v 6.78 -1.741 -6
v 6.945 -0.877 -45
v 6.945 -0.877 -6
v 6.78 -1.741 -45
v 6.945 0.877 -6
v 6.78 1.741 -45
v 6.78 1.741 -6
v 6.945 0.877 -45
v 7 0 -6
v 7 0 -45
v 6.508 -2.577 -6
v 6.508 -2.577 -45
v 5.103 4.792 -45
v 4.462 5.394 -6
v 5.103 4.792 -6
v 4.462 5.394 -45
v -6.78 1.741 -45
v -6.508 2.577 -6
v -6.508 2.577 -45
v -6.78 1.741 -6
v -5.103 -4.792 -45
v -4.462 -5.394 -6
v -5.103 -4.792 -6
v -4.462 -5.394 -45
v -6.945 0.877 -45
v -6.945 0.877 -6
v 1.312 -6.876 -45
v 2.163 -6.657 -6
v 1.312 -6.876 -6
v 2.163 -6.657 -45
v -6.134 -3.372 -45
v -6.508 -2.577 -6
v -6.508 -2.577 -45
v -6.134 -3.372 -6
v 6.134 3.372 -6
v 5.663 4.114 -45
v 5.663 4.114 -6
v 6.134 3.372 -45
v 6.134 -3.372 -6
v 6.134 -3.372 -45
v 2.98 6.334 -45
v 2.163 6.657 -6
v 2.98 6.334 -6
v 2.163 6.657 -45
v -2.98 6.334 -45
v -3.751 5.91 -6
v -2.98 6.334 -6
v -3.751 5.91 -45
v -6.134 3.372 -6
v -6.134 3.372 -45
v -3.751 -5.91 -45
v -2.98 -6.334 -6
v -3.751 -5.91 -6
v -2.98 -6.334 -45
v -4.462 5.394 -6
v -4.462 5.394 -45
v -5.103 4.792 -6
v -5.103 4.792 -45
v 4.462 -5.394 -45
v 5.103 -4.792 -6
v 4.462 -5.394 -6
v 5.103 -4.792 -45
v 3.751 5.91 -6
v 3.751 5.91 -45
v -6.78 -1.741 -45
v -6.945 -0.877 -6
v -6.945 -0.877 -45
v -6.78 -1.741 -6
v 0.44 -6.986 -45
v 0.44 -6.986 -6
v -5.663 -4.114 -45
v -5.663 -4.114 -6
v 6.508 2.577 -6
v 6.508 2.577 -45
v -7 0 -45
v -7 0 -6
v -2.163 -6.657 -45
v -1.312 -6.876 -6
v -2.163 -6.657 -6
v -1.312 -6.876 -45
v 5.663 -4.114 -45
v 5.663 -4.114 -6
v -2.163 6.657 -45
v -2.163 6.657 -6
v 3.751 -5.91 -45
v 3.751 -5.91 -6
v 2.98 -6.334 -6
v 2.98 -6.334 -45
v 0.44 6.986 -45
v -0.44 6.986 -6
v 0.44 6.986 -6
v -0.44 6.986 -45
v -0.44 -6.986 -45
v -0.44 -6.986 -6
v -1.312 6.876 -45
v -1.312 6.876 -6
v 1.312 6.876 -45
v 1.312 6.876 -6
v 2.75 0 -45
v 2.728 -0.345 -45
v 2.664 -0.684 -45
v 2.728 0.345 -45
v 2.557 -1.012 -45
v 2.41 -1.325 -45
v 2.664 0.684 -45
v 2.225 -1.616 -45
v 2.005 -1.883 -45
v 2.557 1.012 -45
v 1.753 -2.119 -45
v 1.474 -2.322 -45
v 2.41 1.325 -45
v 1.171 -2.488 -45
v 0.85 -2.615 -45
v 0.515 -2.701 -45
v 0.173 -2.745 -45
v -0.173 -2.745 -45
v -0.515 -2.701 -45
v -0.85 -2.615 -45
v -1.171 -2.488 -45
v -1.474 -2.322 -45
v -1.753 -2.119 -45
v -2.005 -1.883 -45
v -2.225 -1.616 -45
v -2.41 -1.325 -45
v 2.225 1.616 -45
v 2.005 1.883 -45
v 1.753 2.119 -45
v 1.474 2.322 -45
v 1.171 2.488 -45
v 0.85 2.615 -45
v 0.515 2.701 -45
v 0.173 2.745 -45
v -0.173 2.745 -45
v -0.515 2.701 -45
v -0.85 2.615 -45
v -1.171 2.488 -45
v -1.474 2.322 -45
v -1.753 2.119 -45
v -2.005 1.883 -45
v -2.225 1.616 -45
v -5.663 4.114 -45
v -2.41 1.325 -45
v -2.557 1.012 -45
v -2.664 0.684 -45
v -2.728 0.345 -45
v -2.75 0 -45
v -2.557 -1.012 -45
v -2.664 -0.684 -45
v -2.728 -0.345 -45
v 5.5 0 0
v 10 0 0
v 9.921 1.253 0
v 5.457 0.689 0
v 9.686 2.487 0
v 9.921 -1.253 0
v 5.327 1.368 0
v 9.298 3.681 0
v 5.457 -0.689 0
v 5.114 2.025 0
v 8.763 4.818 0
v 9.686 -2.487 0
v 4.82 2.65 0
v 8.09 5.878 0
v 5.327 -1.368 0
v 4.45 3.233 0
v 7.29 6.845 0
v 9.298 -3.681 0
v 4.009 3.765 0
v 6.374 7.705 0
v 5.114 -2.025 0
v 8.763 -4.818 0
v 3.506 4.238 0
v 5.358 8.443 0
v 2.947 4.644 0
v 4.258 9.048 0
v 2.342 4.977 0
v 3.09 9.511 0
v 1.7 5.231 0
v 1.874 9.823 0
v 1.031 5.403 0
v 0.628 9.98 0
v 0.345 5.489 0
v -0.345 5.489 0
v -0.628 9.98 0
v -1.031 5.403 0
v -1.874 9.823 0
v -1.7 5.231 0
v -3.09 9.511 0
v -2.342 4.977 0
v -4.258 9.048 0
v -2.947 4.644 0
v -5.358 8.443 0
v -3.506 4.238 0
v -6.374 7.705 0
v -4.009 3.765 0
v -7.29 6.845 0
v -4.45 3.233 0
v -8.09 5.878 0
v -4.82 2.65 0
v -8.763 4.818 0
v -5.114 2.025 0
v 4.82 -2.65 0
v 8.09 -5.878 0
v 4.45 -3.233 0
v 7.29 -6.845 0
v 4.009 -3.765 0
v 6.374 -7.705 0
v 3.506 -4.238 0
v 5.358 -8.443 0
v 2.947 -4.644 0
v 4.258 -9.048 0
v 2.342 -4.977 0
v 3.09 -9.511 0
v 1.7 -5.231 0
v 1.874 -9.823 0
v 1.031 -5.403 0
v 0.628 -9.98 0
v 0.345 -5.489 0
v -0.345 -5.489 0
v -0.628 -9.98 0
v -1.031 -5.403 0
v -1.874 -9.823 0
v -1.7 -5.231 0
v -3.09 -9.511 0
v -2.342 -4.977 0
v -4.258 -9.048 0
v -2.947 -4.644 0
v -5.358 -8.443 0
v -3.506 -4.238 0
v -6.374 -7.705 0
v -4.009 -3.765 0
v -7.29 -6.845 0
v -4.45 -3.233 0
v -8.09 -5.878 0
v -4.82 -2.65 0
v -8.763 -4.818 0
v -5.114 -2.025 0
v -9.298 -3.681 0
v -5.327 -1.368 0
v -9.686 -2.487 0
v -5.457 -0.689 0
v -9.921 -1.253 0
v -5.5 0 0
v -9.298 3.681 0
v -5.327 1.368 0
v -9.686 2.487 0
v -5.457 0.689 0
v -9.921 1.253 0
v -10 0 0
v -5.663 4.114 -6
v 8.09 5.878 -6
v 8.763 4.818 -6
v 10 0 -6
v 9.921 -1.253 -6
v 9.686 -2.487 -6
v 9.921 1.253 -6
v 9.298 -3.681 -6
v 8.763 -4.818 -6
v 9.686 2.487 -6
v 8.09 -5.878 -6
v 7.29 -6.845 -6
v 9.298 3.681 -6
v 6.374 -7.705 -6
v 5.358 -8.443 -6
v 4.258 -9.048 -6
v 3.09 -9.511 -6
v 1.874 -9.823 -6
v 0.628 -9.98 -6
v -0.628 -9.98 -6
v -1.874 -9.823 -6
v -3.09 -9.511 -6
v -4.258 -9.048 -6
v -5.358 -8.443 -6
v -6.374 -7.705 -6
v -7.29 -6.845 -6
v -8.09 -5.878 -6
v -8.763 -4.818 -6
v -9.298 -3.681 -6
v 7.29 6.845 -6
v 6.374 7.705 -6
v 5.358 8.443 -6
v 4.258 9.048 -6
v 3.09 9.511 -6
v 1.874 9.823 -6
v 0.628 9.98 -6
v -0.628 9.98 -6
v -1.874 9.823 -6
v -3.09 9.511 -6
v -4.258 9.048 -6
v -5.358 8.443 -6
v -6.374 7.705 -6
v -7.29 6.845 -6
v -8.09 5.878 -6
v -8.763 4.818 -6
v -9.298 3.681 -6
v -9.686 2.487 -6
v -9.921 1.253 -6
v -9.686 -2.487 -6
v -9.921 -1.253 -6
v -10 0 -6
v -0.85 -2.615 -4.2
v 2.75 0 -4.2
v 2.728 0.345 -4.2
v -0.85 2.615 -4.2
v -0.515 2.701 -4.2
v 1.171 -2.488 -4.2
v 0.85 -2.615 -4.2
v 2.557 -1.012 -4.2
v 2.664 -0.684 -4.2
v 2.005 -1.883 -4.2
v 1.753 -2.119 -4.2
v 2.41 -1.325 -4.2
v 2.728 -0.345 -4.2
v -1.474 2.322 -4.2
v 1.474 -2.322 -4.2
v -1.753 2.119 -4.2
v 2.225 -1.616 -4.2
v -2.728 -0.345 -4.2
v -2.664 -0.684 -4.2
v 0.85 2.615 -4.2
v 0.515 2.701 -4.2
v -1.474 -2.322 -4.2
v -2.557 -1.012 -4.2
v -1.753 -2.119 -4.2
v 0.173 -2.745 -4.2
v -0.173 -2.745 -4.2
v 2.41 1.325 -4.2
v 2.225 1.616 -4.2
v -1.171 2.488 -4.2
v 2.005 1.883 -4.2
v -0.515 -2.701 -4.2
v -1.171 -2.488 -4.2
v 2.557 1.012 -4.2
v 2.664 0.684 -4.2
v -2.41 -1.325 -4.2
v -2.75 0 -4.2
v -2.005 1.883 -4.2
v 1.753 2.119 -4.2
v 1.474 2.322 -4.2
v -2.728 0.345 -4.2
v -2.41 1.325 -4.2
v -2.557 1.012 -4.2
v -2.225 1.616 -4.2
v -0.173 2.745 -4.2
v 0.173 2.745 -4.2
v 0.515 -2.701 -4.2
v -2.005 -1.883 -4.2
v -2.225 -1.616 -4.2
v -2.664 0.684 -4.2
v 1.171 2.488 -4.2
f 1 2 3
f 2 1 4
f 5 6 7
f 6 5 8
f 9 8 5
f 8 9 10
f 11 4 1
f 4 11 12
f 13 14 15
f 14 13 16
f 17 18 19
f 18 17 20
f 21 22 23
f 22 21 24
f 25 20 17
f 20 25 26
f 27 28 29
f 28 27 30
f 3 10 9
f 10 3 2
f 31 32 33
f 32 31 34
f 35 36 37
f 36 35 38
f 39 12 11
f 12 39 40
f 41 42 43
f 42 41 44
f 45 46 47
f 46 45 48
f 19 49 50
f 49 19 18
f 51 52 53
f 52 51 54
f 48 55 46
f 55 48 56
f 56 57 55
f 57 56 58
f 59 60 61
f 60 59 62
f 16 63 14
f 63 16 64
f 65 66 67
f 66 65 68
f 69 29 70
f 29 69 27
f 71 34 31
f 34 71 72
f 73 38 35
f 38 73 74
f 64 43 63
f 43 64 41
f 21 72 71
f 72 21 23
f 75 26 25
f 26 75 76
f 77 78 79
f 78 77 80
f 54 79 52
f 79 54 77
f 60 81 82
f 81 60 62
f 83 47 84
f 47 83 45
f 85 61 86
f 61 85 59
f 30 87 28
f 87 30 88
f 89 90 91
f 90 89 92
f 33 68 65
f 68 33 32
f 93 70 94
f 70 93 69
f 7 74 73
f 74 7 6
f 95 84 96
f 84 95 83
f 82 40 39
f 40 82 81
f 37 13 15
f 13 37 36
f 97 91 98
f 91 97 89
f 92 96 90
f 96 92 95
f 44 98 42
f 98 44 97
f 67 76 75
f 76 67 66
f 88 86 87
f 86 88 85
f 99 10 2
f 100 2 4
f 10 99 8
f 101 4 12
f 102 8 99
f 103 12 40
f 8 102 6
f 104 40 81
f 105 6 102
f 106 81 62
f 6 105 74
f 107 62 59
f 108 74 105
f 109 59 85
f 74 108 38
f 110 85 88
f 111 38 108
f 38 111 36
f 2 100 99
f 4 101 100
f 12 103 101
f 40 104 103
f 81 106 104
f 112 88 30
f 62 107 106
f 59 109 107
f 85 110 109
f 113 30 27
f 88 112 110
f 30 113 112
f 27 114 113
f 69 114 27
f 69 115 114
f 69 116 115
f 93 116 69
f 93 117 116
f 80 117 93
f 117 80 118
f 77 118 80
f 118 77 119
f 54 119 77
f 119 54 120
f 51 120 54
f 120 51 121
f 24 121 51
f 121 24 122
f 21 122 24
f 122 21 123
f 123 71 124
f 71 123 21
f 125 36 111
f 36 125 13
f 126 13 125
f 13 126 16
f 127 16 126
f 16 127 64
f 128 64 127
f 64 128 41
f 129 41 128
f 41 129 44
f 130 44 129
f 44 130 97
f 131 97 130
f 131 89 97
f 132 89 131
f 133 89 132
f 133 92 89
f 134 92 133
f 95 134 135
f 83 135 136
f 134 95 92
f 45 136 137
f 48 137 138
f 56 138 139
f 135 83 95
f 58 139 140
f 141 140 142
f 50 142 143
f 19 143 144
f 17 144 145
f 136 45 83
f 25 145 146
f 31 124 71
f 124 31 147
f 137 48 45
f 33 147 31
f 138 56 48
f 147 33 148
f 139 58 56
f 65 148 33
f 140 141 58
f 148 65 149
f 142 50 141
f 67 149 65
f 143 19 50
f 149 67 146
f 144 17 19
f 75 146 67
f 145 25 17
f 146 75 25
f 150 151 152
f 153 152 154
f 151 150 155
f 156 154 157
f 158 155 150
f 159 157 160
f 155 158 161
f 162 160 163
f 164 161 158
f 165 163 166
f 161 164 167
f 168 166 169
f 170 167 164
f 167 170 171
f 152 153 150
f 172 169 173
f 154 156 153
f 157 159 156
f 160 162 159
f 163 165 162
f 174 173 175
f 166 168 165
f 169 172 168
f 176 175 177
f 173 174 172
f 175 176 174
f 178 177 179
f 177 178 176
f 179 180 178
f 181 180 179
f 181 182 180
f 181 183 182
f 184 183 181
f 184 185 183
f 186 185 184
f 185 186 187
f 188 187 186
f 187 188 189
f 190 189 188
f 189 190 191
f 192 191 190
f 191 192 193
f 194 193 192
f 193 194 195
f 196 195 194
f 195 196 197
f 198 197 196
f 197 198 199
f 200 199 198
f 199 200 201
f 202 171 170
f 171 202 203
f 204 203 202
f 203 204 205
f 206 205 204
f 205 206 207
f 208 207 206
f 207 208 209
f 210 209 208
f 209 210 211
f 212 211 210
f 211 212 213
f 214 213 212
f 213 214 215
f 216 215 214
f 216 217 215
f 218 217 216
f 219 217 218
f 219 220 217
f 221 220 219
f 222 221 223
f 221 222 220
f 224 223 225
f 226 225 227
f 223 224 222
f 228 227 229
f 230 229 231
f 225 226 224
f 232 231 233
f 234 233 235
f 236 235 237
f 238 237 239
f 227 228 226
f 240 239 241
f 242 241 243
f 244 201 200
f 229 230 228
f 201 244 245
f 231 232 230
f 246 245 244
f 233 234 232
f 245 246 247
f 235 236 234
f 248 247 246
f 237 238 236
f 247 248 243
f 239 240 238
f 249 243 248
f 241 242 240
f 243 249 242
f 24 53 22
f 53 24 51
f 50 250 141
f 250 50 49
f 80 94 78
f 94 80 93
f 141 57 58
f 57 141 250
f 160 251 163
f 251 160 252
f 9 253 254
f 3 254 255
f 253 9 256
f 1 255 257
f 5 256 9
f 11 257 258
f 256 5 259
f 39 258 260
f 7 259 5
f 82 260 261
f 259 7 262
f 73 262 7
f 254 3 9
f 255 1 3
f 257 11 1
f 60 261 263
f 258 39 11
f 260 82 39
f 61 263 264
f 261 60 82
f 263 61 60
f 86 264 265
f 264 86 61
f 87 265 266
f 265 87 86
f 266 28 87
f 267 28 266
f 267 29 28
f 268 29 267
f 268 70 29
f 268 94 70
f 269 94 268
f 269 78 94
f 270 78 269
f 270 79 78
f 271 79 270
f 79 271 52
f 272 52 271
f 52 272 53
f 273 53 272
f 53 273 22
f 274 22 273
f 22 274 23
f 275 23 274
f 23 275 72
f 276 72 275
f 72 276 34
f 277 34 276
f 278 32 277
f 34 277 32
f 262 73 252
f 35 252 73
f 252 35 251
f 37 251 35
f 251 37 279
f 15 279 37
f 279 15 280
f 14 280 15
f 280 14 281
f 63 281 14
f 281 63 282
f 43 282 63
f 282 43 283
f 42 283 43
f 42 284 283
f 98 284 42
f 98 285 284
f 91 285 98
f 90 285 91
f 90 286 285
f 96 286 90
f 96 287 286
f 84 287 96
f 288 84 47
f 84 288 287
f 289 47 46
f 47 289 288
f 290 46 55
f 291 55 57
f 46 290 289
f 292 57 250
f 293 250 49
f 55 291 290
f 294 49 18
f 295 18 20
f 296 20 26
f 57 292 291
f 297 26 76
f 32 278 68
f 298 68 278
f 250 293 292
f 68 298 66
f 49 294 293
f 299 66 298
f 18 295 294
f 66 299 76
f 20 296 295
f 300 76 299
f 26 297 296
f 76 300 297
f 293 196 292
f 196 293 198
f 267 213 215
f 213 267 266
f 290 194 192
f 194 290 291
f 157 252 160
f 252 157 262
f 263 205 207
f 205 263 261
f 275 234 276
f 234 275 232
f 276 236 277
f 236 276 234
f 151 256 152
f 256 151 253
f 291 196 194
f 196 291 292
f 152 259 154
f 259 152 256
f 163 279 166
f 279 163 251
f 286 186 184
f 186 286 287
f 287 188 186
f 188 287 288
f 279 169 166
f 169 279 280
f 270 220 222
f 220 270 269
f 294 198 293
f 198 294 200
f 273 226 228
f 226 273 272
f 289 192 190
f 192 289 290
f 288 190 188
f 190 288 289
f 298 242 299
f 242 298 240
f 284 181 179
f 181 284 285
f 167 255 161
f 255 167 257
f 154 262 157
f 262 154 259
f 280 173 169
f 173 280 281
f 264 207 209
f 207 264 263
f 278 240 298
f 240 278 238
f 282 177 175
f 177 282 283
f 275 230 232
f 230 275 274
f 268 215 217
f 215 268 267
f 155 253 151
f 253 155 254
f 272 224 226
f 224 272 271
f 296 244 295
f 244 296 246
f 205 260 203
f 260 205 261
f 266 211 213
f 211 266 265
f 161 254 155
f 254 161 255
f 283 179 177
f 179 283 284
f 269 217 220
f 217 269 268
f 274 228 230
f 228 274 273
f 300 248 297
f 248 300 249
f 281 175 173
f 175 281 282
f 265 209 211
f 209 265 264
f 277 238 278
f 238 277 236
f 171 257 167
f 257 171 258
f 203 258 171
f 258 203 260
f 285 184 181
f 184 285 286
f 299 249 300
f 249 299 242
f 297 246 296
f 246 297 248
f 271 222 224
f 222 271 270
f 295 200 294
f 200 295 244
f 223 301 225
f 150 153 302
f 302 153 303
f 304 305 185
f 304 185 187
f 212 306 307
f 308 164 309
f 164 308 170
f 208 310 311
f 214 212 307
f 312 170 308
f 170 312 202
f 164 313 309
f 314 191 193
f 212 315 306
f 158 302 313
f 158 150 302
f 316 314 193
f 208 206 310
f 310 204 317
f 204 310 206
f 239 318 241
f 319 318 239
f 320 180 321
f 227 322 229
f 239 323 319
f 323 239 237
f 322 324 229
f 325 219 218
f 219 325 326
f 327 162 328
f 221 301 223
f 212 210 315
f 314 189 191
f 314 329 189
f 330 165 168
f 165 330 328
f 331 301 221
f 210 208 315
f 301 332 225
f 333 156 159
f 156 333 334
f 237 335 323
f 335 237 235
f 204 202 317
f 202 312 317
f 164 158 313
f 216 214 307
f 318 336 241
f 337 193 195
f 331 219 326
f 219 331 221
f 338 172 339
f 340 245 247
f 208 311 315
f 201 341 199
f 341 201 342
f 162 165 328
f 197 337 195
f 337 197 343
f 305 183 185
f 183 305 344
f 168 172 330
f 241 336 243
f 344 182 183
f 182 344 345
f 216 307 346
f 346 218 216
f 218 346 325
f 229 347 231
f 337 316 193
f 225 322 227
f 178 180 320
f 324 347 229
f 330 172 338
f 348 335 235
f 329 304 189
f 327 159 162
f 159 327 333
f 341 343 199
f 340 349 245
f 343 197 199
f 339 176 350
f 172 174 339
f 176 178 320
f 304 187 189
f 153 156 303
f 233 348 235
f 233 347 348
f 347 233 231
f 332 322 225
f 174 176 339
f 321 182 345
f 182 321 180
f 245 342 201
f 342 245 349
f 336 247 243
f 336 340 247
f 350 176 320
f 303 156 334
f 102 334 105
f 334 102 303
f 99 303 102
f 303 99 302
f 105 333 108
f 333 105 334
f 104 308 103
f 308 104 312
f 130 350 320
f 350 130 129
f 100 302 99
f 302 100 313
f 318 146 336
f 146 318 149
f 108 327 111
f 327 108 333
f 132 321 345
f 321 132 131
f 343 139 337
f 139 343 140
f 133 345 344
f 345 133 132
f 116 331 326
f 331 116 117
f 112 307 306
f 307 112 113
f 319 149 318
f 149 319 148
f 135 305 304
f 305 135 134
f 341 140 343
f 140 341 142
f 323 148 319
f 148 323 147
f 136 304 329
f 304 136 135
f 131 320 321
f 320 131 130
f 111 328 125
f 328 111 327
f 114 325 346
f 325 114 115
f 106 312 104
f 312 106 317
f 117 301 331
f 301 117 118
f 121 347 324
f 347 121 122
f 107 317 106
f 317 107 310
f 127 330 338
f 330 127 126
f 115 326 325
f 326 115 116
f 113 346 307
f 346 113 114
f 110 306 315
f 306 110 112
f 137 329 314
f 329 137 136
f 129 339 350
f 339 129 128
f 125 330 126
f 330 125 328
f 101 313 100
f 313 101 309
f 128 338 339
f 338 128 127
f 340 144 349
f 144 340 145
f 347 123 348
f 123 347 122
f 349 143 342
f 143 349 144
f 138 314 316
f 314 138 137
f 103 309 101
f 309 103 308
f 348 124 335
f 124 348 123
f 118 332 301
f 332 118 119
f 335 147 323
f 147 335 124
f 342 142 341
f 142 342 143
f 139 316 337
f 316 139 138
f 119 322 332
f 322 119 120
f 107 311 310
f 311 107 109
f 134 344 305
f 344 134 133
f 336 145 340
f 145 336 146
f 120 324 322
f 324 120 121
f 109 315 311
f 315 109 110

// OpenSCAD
$fn = 50;


difference() {
	union() {
		translate(v = [0, 0, -45.0000000000]) {
			cylinder(h = 45, r = 7.0000000000);
		}
		translate(v = [0, 0, -6.0000000000]) {
			cylinder(h = 6, r = 10.0000000000);
		}
	}
	union() {
		translate(v = [0, 0, 0]) {
			rotate(a = [0, 0, 0]) {
				difference() {
					union() {
						#translate(v = [0, 0, -45.0000000000]) {
							cylinder(h = 45, r = 2.2500000000);
						}
						#translate(v = [0, 0, -4.2000000000]) {
							cylinder(h = 4.2000000000, r = 7.0000000000, r1 = 2.7500000000, r2 = 5.5000000000);
						}
						#translate(v = [0, 0, -45.0000000000]) {
							cylinder(h = 45, r = 2.7500000000);
						}
						#translate(v = [0, 0, -45.0000000000]) {
							cylinder(h = 45, r = 2.2500000000);
						}
					}
					union();
				}
			}
		}
	}
}
